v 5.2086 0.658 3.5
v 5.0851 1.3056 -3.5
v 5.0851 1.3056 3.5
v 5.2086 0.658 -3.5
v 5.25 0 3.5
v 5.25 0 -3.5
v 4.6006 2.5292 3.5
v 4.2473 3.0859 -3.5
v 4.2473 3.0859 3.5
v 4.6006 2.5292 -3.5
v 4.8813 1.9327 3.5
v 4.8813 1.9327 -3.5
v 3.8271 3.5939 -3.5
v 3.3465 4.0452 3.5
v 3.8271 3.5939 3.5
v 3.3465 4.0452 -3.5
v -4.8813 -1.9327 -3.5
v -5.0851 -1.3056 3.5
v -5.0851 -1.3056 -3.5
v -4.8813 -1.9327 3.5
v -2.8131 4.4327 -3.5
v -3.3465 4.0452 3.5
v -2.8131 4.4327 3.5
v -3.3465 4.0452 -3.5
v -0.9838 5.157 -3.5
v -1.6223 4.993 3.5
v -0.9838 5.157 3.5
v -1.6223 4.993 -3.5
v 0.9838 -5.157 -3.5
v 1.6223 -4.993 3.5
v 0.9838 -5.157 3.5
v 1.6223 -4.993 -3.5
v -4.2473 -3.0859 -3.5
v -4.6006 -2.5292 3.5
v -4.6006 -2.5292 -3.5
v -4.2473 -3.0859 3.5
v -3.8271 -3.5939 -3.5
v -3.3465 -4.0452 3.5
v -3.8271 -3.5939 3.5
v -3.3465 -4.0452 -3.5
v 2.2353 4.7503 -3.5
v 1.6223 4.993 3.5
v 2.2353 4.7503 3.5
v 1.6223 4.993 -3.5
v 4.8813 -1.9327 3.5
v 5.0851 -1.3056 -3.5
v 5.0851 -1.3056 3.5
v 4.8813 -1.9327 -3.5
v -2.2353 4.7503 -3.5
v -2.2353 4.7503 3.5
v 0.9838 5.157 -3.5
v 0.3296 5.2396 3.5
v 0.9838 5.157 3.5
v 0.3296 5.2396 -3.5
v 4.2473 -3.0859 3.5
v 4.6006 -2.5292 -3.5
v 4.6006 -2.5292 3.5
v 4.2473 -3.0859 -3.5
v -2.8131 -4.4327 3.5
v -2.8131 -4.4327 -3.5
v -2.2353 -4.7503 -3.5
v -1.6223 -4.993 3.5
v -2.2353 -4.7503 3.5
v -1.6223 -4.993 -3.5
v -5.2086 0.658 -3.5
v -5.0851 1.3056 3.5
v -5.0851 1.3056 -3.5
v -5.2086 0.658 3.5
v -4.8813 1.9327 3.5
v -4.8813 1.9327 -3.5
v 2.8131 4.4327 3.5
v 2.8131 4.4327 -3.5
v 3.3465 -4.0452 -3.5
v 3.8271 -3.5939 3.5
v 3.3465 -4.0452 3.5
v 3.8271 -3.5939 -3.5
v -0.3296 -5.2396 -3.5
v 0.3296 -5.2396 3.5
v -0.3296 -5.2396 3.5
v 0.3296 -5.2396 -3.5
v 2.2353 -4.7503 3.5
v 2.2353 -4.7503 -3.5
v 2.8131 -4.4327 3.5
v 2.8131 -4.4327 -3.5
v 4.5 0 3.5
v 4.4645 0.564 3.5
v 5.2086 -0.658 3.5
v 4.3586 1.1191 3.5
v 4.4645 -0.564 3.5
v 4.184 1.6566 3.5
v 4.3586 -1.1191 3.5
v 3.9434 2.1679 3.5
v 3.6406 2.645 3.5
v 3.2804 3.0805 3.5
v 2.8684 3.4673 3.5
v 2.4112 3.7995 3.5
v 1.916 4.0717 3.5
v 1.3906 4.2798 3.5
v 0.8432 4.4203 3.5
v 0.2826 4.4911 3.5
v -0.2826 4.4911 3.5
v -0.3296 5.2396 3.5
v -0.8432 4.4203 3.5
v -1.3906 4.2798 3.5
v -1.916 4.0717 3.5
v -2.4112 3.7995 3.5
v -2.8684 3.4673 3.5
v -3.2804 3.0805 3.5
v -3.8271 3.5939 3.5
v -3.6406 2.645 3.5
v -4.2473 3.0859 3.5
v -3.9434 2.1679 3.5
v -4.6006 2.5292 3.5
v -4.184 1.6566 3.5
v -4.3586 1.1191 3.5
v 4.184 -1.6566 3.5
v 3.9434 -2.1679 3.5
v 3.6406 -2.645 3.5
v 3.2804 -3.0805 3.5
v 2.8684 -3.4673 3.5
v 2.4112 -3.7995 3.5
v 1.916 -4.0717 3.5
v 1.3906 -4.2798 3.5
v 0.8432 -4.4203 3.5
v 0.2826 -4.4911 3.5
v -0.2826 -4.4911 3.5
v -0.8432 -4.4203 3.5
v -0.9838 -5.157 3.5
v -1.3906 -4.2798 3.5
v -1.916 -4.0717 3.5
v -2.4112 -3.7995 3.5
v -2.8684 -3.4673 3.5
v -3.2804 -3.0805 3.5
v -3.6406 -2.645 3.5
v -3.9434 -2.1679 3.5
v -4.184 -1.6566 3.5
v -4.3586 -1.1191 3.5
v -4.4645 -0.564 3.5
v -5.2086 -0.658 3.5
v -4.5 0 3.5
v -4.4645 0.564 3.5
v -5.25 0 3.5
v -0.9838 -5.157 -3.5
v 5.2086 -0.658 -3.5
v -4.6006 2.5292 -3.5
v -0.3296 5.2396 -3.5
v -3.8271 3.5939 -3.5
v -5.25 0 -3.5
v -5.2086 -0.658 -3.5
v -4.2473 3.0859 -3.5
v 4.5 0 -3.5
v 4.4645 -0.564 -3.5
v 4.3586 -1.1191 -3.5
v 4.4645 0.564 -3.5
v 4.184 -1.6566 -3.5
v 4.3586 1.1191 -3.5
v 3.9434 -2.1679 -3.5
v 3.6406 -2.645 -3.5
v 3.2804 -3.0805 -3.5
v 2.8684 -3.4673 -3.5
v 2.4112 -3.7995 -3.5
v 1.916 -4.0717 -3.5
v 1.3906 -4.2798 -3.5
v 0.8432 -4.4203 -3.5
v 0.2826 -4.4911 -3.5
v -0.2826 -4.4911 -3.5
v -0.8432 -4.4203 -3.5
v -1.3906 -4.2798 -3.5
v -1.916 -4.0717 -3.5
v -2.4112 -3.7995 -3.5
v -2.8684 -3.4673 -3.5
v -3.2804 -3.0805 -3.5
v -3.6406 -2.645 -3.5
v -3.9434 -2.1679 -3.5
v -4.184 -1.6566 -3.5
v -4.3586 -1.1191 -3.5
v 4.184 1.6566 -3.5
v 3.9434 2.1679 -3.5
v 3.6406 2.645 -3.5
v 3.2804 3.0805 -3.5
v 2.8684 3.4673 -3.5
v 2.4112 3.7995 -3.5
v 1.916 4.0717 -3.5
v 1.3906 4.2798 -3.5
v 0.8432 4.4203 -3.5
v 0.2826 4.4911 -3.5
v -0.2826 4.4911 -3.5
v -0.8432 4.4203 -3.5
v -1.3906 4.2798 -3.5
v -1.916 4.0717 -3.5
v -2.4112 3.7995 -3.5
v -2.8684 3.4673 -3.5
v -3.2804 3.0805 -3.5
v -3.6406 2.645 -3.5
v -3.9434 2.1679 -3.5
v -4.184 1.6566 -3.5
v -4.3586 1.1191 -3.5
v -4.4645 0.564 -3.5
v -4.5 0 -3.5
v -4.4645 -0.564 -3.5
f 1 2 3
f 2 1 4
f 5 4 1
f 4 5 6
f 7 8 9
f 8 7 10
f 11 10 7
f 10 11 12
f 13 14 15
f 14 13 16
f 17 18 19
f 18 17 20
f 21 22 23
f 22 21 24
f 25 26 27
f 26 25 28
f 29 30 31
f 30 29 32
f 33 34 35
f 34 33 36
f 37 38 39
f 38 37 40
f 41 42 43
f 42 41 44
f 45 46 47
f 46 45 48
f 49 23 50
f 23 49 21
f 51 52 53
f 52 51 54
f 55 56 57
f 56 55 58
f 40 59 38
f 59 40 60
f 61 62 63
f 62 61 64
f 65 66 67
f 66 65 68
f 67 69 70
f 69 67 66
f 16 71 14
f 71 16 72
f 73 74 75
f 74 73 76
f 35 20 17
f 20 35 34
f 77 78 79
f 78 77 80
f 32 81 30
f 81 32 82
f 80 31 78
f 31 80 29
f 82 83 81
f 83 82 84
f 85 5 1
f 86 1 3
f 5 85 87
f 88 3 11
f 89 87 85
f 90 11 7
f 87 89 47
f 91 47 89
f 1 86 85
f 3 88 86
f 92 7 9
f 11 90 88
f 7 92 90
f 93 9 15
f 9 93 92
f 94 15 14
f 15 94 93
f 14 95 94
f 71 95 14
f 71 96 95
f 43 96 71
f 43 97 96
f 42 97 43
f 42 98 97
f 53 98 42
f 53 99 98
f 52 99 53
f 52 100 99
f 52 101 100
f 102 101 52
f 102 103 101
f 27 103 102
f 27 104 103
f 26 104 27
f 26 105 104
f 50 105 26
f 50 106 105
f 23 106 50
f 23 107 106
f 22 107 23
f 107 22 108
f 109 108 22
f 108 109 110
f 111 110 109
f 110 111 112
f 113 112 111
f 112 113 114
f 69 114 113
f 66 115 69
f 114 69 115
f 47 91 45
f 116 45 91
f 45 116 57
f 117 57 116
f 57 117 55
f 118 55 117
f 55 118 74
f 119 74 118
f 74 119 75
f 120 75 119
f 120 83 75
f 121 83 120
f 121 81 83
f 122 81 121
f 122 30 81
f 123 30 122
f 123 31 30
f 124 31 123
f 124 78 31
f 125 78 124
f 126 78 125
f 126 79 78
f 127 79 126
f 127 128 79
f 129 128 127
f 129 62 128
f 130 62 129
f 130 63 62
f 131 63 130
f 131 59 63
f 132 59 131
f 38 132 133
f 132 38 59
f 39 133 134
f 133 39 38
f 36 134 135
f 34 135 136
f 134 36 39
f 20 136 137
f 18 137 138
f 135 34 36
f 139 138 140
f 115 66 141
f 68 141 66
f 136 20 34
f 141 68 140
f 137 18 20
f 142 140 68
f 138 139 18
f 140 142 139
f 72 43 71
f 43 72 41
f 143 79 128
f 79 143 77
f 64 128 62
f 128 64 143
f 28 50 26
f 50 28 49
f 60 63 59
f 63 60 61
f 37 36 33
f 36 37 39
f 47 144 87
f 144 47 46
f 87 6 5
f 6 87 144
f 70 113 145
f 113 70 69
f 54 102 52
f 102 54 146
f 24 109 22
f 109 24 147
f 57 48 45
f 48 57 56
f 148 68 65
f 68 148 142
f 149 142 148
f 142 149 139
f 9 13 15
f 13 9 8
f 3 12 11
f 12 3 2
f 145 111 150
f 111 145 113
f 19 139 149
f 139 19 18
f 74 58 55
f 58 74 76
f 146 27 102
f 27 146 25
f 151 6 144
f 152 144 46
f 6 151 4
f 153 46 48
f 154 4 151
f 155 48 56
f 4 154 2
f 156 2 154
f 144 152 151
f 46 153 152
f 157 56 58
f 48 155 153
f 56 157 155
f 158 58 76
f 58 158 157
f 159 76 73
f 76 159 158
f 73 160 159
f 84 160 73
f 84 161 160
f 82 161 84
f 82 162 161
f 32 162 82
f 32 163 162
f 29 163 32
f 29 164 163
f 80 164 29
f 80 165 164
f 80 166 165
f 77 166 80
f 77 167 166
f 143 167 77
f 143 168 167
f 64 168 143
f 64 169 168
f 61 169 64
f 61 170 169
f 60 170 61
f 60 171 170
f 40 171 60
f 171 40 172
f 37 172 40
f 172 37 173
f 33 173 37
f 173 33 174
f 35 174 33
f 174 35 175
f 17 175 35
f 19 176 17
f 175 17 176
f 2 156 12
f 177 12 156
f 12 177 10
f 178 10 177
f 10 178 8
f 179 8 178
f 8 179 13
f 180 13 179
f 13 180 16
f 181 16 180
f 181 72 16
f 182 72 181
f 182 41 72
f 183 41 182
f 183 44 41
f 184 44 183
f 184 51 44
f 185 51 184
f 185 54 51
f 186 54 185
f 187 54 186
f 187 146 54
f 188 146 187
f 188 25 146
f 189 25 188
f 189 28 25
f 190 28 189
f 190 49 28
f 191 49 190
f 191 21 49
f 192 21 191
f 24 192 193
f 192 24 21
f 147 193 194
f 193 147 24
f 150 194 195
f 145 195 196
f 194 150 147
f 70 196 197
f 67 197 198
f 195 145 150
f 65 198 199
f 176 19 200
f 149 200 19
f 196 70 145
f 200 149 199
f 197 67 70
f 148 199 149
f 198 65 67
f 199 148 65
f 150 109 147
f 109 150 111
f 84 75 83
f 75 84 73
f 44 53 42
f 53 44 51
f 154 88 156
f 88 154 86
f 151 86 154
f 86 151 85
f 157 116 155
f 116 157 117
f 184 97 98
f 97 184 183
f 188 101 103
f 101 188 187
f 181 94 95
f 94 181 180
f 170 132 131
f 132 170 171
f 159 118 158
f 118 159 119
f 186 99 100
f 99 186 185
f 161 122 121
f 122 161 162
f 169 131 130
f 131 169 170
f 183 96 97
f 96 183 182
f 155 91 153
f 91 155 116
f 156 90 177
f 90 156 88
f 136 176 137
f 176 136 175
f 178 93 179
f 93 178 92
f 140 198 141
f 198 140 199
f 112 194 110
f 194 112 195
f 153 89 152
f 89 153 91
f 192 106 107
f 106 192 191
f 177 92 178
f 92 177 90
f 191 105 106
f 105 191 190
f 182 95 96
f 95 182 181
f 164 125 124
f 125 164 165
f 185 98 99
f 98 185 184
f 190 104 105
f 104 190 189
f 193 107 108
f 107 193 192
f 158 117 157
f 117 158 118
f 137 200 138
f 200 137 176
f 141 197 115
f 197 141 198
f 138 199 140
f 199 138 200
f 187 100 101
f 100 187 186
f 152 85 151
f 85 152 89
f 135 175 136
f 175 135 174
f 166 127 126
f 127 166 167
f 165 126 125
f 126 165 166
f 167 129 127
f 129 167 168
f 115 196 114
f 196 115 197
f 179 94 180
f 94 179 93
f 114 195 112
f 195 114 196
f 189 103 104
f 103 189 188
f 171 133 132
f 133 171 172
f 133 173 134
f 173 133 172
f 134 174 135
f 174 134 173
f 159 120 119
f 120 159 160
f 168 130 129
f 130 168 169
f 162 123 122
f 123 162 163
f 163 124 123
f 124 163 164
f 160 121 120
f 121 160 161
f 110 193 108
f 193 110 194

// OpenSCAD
$fn = 50;


difference() {
	union() {
		translate(v = [0, 0, -3.5000000000]) {
			cylinder(h = 7, r = 5.2500000000);
		}
	}
	union() {
		translate(v = [0, 0, -100.0000000000]) {
			cylinder(h = 200, r = 4.5000000000);
		}
	}
}
